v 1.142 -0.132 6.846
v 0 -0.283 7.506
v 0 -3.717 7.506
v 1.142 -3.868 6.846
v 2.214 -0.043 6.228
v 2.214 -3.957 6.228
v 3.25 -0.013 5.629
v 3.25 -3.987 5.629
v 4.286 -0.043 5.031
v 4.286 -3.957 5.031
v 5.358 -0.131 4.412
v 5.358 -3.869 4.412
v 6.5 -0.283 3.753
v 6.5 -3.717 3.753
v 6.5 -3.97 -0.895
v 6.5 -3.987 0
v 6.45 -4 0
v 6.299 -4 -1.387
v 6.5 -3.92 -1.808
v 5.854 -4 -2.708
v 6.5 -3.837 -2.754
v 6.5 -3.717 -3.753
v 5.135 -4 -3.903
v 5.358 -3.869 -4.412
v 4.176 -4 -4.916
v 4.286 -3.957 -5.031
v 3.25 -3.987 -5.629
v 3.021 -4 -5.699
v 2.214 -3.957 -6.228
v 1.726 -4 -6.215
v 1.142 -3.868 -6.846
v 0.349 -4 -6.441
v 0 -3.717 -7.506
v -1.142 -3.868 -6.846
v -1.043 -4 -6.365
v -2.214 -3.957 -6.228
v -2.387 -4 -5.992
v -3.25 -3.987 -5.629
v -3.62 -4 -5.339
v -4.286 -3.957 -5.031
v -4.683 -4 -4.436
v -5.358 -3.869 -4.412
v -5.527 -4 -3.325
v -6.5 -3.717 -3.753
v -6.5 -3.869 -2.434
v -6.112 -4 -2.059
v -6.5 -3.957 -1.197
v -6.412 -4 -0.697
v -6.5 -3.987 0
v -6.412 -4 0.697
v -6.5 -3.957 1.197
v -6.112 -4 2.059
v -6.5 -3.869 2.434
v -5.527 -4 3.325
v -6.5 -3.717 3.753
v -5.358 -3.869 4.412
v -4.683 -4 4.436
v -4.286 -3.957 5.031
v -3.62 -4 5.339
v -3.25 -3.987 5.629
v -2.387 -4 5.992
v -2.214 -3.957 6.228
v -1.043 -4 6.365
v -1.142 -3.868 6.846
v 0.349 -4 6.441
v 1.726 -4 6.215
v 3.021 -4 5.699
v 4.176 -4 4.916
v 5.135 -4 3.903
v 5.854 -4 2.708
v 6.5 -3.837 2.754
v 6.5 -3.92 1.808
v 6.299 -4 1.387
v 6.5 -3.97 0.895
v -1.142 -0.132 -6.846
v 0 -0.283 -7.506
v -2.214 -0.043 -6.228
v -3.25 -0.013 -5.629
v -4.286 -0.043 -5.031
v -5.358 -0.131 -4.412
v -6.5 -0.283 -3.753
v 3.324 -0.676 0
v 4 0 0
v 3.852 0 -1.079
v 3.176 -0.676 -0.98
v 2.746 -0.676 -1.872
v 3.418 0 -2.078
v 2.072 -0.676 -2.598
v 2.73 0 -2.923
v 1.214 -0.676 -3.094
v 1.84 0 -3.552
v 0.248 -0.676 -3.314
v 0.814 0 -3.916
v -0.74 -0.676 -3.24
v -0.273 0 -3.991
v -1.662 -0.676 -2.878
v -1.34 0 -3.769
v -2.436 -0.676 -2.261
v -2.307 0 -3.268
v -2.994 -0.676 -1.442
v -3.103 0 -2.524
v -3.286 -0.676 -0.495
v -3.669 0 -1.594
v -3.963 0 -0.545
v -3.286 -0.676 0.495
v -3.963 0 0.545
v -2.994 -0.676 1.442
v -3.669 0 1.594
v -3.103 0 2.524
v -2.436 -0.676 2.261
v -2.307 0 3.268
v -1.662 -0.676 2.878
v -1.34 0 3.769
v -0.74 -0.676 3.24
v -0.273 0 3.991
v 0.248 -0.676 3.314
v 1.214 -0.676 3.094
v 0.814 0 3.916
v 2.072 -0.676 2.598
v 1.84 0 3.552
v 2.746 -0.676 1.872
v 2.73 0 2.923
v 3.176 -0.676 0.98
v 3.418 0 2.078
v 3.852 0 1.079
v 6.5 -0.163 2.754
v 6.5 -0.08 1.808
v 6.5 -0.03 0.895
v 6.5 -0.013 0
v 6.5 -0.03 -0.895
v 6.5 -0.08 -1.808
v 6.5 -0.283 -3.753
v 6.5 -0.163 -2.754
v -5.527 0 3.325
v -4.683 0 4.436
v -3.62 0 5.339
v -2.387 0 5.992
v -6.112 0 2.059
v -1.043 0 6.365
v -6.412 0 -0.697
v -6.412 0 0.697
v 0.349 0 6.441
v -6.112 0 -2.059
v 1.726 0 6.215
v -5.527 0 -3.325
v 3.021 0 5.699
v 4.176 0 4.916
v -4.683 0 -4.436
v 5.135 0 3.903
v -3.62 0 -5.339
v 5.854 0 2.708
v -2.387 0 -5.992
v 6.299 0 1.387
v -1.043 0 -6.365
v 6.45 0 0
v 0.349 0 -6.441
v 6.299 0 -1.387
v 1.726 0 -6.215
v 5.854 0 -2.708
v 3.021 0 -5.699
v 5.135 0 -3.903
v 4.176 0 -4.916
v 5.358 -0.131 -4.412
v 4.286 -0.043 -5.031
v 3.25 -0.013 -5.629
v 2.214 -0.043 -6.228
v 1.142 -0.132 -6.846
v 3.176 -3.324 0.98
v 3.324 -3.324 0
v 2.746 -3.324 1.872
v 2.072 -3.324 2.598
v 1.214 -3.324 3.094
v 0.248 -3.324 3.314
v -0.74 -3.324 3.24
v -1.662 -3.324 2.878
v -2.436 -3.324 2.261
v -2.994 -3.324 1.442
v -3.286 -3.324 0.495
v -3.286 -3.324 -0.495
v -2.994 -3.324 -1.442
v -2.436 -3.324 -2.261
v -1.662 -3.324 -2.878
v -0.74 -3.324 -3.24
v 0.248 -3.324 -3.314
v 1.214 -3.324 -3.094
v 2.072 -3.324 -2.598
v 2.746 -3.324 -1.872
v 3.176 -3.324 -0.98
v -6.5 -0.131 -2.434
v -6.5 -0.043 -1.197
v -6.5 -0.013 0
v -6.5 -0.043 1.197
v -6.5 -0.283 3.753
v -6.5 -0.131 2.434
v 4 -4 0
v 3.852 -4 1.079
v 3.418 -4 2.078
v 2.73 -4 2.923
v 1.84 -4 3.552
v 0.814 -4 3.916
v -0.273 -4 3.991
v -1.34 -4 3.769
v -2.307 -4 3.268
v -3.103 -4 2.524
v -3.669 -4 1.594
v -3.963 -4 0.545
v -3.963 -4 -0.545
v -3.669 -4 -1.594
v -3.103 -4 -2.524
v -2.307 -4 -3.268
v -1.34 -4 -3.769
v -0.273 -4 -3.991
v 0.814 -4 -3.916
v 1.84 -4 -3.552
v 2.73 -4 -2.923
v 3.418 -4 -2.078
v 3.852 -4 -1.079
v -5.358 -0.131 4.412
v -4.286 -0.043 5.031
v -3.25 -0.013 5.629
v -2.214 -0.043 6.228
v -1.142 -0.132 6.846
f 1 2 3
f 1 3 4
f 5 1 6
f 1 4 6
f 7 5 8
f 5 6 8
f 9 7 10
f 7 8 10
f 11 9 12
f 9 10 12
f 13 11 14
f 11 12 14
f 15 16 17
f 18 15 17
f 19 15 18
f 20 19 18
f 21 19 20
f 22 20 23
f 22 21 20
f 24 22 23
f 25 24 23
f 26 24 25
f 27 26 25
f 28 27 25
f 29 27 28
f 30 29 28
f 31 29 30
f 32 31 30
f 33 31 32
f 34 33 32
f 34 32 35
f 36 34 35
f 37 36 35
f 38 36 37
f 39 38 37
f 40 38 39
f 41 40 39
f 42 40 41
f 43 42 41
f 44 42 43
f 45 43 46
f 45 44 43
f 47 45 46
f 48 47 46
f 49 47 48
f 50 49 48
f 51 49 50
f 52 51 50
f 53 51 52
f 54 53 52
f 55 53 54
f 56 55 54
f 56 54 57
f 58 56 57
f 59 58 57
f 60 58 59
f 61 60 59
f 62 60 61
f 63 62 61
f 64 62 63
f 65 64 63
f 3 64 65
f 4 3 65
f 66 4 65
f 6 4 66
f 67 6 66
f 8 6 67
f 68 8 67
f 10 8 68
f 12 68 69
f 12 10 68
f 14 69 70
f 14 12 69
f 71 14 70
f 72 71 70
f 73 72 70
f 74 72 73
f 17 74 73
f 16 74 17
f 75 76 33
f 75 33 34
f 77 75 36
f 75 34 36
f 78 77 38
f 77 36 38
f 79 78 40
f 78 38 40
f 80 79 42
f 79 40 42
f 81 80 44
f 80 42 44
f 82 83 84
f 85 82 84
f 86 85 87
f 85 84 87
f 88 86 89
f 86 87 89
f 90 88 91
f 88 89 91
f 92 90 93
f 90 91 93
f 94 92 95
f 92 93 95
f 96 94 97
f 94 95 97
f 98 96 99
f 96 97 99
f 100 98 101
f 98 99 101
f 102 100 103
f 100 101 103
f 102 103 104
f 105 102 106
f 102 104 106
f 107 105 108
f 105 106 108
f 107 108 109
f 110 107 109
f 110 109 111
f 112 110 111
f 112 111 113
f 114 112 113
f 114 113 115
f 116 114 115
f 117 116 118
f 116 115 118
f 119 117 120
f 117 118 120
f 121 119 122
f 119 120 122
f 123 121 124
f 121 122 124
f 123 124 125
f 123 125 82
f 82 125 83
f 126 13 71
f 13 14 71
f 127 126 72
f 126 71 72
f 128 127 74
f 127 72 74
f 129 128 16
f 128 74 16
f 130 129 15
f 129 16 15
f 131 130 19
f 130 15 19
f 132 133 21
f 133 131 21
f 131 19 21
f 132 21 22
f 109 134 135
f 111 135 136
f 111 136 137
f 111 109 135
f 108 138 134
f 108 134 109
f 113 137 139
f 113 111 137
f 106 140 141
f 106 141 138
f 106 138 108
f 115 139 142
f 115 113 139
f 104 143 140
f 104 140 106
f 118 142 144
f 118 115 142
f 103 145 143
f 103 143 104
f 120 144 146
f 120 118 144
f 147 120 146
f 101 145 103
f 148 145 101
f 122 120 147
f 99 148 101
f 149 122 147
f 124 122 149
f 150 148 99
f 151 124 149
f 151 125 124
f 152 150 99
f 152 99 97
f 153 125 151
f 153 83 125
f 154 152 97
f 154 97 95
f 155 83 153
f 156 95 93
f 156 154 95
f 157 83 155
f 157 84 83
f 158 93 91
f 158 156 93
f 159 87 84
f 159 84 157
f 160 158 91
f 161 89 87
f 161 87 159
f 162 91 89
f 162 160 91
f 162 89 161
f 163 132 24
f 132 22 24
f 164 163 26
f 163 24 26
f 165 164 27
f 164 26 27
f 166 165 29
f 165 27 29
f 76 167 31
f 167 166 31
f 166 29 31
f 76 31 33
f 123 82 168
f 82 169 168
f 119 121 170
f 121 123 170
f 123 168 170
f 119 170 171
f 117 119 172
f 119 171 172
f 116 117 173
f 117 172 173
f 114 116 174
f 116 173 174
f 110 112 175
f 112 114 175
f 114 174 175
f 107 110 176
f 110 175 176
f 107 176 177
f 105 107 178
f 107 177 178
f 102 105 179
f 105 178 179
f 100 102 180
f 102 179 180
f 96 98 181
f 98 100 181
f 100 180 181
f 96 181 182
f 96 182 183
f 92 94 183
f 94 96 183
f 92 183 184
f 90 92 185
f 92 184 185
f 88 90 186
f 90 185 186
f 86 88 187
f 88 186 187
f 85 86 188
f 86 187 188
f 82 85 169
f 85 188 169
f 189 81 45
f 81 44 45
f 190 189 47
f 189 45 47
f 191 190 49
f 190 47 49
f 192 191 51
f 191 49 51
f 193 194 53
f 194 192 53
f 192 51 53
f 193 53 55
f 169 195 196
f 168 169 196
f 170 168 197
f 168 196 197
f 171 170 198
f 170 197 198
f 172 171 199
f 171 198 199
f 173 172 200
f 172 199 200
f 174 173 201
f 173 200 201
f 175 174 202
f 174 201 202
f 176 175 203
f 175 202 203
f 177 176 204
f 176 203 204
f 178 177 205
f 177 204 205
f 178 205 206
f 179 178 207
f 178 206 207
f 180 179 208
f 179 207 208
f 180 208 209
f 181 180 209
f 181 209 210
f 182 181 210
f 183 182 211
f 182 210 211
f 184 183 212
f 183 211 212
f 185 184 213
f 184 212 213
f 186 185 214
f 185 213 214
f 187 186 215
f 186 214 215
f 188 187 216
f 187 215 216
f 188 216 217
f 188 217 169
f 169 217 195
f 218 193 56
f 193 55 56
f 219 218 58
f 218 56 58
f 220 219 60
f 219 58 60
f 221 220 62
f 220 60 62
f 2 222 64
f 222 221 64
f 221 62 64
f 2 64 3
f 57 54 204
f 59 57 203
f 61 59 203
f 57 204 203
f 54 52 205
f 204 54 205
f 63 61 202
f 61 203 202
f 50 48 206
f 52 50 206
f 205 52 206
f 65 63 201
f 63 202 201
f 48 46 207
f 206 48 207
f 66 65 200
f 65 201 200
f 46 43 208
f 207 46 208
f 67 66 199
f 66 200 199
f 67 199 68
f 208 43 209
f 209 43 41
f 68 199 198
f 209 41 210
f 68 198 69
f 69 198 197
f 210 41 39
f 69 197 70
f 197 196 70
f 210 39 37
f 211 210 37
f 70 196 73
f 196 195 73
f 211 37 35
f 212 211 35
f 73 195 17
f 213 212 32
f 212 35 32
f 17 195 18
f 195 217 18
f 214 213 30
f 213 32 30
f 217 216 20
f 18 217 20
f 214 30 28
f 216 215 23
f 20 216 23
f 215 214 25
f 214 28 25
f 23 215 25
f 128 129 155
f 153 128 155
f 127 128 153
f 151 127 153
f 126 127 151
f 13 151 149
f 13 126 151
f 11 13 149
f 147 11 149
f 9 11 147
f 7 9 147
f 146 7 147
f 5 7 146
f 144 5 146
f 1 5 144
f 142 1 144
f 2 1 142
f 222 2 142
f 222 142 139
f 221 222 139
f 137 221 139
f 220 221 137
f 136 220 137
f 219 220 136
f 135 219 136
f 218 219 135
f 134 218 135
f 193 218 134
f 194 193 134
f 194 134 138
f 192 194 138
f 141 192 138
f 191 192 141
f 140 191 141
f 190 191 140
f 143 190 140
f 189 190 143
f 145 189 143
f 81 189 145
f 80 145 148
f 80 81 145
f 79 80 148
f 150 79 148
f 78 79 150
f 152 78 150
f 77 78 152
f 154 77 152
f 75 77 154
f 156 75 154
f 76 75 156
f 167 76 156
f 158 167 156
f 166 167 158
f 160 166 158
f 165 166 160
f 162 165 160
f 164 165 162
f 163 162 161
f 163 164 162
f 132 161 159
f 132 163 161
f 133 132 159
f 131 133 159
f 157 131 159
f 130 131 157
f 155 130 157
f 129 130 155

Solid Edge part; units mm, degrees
sketch "Sketch1" plane through (0, 0, 0) normal (0, 0, 1) x (1, 0, 0)
  line L0 (0, 0) -> (6.45, 0)
  line L1 (6.45, 0) -> (13.9141, -2)
  line L2 (13.9141, -2) -> (6.45, -4)
  line L3 (6.45, -4) -> (0, -4)
  line L4 (0, -4) -> (0, 0)
revolve "RevolvedProtrusion1" add sketch "Sketch1" angle 360 about axis through (0, -4, 0) along (0, 1, 0)
sketch "Sketch2" plane through (0, 0, 0) normal (0, -1, 0) x (1, 0, 0)
  line L0 (-26, -26) -> (-26, 26)
  line L1 (-26, 26) -> (26, 26)
  line L2 (26, 26) -> (26, -26)
  line L3 (26, -26) -> (-26, -26)
  line L4 (-6.5, 3.7528) -> (0, 7.5056)
  line L5 (0, 7.5056) -> (6.5, 3.7528)
  line L6 (6.5, 3.7528) -> (6.5, -3.7528)
  line L7 (6.5, -3.7528) -> (0, -7.5056)
  line L8 (0, -7.5056) -> (-6.5, -3.7528)
  line L9 (-6.5, -3.7528) -> (-6.5, 3.7528)
extrude "ExtrudedCutout_1" cut sketch "Sketch2" against normal blind 5 and the other way blind 5
sketch "Sketch3" plane through (0, 0, 0) normal (0, 0, 1) x (1, 0, 0)
  line L0 (0, 0) -> (4, 0)
  line L1 (4, 0) -> (3.3235, -0.6765)
  line L2 (3.3235, -0.6765) -> (3.3235, -3.3235)
  line L3 (3.3235, -3.3235) -> (4, -4)
  line L4 (4, -4) -> (0, -4)
  line L5 (0, -4) -> (0, 0)
revolve "RevolvedCutout1" cut sketch "Sketch3" angle 360 about axis through (0, -4, 0) along (0, 1, 0)
cosmetic_thread "Thread_1" size "M8" thread depth 2.647
properties part number "DIN-439-B - M8(F)"
